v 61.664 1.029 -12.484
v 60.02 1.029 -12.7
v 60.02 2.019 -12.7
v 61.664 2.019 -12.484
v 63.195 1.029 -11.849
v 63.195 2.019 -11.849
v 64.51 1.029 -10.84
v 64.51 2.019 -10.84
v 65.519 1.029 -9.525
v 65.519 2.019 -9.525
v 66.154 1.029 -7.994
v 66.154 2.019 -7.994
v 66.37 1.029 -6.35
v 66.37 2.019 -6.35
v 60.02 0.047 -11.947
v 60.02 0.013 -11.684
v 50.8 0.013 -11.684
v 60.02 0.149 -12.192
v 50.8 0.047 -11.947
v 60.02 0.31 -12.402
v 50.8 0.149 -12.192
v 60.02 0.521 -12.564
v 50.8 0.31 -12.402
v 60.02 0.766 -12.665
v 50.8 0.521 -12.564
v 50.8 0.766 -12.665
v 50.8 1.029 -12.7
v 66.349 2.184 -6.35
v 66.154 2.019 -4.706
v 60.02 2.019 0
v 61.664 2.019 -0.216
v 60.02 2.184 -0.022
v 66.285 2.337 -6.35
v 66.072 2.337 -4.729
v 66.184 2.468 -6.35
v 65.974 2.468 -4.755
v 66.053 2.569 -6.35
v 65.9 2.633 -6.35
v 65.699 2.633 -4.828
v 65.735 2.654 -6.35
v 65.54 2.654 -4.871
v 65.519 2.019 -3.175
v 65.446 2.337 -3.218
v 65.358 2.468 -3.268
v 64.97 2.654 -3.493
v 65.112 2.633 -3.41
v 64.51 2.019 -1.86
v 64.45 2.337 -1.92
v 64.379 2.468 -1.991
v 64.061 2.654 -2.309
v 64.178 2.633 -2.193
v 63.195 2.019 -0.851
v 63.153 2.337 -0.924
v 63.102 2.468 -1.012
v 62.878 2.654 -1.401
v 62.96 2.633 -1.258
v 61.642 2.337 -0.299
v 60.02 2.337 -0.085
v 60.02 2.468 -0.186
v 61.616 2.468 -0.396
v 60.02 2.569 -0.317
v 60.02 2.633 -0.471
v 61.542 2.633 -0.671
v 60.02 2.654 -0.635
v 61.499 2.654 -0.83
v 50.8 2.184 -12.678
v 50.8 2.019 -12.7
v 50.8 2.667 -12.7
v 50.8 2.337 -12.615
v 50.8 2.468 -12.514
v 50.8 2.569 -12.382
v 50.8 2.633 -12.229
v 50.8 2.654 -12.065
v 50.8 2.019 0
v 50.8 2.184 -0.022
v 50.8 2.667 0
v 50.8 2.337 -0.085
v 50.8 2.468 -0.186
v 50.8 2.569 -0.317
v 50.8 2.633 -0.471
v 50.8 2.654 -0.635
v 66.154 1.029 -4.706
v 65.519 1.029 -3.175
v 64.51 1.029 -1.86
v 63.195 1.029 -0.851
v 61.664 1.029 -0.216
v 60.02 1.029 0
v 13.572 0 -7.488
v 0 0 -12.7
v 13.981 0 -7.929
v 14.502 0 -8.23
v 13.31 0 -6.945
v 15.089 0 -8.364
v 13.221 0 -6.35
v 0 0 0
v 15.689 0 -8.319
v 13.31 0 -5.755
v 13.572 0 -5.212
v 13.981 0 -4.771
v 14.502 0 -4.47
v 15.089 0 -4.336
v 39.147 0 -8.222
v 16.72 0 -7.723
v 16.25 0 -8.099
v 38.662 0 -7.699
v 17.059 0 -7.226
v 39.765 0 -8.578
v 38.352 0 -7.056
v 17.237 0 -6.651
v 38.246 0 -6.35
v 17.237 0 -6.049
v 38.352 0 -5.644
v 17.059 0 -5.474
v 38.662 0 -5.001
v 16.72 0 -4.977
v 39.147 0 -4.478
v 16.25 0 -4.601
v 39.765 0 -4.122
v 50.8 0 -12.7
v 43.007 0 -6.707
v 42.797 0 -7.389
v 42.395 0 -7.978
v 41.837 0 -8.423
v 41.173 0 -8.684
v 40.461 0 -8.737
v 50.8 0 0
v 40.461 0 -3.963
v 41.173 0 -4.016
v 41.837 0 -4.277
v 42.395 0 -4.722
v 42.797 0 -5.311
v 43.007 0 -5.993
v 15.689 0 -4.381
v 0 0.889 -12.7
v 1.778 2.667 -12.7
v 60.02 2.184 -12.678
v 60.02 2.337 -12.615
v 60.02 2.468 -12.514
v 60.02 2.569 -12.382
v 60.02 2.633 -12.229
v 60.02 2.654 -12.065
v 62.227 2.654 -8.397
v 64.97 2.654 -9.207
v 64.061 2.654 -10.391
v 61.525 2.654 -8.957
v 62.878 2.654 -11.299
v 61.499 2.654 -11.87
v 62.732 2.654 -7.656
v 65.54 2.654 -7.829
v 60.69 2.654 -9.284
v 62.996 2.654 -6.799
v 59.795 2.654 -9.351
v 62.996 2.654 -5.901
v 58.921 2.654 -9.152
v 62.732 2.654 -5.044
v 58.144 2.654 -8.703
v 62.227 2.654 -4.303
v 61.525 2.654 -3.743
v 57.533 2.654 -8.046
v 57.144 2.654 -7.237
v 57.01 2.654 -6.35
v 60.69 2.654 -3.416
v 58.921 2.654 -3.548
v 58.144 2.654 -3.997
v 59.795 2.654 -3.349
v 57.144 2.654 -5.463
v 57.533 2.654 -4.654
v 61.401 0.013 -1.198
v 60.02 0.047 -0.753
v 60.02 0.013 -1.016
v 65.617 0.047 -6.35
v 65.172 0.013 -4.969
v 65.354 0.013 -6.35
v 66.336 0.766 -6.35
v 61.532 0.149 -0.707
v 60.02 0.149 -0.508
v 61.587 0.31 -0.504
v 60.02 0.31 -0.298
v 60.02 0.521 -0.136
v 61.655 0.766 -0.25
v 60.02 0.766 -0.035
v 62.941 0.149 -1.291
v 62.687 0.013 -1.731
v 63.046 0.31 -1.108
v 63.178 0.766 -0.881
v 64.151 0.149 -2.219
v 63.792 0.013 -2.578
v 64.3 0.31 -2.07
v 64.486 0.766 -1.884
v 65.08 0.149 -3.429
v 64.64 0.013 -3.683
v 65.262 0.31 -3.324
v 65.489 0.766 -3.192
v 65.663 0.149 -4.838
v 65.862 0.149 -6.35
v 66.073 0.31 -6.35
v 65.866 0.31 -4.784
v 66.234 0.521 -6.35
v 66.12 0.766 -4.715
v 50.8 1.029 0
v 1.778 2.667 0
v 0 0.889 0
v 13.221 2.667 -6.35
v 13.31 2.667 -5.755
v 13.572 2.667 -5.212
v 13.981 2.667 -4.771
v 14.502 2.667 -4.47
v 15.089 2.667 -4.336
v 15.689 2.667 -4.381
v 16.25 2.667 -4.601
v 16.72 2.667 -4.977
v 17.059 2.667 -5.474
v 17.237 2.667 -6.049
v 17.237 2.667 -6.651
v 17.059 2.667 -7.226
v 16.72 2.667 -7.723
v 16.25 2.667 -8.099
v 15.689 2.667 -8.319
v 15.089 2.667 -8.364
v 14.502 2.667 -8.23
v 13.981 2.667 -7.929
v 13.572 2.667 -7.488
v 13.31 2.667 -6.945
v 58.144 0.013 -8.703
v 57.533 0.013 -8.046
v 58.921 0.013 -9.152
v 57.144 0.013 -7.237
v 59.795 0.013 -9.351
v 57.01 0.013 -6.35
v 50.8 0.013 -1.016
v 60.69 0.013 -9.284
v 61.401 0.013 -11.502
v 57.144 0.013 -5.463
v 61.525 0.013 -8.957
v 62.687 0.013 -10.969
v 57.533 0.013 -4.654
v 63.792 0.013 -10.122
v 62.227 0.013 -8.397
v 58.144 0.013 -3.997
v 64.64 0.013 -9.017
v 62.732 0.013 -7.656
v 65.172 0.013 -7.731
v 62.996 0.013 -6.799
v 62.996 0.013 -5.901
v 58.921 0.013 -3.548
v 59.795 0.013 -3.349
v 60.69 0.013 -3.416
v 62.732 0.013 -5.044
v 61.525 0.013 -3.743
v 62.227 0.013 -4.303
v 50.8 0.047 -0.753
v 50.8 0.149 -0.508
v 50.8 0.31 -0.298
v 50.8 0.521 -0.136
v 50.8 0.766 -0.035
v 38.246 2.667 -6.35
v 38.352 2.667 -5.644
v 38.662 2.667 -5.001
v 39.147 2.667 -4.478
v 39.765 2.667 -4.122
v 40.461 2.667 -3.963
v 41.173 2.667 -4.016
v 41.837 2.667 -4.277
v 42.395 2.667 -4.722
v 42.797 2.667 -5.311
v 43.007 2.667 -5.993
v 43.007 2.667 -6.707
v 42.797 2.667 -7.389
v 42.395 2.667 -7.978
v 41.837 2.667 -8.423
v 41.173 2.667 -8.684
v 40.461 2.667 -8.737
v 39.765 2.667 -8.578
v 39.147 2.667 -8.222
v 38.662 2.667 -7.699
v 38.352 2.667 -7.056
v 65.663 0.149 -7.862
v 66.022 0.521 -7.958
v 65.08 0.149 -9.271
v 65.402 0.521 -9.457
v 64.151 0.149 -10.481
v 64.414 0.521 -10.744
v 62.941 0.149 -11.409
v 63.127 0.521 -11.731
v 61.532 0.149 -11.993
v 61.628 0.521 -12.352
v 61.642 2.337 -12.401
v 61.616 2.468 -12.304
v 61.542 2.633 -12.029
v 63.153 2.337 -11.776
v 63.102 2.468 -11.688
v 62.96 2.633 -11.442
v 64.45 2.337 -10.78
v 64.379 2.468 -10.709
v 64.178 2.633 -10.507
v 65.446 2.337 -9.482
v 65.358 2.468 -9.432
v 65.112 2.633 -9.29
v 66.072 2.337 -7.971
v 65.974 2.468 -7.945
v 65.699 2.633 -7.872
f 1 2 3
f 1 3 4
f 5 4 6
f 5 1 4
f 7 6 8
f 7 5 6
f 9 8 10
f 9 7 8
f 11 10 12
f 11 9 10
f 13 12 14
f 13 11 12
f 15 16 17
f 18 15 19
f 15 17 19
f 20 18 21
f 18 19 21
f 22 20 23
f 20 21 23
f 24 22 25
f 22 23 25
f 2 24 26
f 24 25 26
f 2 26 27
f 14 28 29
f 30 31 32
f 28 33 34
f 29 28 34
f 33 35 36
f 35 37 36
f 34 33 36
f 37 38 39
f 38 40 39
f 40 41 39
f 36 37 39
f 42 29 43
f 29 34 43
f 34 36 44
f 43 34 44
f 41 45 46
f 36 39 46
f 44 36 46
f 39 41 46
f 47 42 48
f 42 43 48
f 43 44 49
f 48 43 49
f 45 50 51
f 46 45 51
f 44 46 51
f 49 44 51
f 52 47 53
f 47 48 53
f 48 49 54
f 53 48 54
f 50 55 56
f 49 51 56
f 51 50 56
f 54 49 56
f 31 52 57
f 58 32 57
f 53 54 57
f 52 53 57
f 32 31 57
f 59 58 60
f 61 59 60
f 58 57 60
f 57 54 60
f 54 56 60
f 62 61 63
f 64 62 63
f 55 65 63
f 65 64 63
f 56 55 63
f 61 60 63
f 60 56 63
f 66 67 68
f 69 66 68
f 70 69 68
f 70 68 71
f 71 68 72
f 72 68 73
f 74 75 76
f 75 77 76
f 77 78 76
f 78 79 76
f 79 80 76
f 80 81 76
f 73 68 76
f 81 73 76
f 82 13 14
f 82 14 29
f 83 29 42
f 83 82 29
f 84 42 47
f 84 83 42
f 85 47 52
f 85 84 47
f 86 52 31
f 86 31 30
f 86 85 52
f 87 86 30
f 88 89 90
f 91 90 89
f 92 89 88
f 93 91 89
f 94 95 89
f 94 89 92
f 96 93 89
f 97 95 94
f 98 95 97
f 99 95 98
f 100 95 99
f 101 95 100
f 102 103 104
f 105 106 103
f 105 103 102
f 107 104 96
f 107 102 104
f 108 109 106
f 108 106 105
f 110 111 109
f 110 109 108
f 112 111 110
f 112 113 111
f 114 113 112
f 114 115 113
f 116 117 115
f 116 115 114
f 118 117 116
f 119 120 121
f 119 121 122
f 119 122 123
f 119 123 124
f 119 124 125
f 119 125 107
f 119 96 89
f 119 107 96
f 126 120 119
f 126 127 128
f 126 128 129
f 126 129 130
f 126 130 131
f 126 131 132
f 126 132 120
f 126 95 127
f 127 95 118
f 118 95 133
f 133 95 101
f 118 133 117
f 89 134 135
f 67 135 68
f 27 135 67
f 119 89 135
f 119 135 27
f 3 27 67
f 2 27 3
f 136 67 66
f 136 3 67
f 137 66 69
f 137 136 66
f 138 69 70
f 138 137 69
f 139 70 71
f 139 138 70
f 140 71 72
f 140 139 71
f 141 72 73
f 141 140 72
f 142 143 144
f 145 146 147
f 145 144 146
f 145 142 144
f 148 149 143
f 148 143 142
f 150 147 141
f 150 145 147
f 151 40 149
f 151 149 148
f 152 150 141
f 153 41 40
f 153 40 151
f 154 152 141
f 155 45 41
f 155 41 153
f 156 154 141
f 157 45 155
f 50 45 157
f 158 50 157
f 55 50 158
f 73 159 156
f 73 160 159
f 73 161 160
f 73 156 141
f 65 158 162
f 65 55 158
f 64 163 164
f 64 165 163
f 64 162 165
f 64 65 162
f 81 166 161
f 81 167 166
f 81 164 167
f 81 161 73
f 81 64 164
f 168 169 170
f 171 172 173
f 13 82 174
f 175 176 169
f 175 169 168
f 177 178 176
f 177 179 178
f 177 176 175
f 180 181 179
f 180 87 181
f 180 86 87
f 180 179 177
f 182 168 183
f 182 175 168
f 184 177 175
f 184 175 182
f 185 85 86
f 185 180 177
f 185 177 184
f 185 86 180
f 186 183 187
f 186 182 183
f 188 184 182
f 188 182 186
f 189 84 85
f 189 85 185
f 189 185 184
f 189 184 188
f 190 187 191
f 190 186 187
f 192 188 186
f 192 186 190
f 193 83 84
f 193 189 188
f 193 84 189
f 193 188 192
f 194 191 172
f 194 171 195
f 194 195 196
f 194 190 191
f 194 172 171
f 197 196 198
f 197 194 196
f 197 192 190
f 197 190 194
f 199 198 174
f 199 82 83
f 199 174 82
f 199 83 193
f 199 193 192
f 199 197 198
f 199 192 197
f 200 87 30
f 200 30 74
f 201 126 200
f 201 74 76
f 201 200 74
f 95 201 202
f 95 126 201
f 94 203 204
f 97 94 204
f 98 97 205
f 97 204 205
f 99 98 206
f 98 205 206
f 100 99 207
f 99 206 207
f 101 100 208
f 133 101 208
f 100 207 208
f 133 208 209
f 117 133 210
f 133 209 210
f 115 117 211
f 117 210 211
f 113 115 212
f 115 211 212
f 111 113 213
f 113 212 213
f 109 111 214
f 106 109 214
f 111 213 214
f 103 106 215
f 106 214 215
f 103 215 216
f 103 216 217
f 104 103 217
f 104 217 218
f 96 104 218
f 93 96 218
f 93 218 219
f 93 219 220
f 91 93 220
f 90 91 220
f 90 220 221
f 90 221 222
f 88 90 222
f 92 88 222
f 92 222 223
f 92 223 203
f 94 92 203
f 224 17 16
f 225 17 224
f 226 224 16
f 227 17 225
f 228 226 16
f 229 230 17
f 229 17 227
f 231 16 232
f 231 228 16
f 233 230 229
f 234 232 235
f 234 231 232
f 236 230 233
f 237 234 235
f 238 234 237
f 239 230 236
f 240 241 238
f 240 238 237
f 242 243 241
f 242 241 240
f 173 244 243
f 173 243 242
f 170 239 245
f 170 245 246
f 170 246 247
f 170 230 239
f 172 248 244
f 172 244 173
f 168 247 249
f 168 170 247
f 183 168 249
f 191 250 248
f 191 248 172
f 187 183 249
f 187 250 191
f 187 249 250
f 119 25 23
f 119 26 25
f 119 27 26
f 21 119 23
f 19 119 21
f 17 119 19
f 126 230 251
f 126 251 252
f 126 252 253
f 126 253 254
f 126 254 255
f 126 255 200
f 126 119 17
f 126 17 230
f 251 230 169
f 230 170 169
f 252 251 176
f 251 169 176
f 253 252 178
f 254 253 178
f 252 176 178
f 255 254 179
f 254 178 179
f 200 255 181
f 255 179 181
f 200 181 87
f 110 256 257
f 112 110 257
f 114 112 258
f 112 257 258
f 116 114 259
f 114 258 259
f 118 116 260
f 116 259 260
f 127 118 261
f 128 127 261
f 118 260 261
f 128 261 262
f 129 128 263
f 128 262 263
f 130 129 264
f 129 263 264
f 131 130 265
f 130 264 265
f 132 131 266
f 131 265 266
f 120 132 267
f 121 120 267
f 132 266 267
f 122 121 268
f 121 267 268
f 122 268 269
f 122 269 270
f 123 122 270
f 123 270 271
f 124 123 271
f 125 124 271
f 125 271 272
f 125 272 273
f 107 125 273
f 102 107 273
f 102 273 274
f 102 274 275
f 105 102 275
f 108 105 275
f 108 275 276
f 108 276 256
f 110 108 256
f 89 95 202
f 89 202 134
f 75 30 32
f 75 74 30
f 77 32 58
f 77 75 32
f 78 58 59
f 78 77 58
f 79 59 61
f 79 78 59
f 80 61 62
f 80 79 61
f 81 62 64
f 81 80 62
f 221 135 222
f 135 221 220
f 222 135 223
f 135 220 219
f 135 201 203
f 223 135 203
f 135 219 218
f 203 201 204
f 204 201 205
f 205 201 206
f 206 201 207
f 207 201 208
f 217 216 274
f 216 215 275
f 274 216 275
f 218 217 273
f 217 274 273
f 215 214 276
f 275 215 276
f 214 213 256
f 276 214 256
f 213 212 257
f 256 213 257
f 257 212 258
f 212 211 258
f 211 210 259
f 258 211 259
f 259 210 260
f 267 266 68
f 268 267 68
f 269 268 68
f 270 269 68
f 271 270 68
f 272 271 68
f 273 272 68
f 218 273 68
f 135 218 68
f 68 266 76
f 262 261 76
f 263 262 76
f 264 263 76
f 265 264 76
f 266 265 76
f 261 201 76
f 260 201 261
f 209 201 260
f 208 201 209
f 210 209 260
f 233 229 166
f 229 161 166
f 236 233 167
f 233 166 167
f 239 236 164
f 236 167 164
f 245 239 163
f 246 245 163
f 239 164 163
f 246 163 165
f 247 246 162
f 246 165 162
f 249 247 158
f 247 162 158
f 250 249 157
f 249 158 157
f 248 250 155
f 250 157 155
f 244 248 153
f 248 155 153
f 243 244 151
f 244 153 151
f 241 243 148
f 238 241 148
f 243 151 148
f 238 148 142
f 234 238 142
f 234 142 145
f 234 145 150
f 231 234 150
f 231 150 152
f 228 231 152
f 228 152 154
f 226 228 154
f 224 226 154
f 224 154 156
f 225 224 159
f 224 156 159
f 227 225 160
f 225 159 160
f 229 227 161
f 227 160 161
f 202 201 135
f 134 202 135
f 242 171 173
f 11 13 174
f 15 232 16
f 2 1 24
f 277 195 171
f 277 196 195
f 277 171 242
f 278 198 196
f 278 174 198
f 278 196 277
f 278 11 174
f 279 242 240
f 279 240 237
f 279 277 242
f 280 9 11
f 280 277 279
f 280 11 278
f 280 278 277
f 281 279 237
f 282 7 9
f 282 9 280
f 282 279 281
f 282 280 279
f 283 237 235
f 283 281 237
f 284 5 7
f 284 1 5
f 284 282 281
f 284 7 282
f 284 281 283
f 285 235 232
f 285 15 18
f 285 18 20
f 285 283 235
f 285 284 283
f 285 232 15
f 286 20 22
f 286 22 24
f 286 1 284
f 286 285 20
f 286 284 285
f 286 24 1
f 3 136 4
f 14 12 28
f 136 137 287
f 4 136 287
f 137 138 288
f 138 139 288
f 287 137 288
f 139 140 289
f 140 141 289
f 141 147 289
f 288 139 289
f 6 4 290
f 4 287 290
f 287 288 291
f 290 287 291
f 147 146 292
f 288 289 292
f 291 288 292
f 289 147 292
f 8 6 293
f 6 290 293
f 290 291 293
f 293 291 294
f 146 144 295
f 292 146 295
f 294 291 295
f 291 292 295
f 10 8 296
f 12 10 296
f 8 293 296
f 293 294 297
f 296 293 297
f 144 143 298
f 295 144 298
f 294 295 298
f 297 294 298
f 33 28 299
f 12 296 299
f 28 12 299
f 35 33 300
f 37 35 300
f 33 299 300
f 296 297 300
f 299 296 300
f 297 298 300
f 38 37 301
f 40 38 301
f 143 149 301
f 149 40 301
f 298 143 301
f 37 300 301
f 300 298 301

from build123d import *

# Parameters (mm, degrees)
F1_DEPTH  = 2.667
F3_D      = 6.0198
F4_D      = 4.7879
F5_D      = 4.0386
F6_W      = 32.8803089343
F6_H      = 42.4424372282
F7_DEPTH  = 0.0127
F8_W      = 27.7899198272
F8_H      = 25.566725319
F9_DEPTH  = 0.0127
F10_R     = 1.016
F11_R     = 0.635
F12_SIZE2 = 1.778
F12_SIZE  = 1.778


with BuildPart() as f1:
    # F0 (on Front) → F1 (new body)
    with BuildSketch(Plane.XZ):
        with BuildLine():
            Line((60.0202, 0), (0, 0))
            Line((0, 0), (0, -12.7))
            Line((0, -12.7), (60.0202, -12.7))
            ThreePointArc((60.0202, -12.7), (64.5103280605, -10.8401280605), (66.3702, -6.35))
            ThreePointArc((66.3702, -6.35), (64.5103280605, -1.8598719395), (60.0202, 0))
        make_face()
    extrude(amount=-F1_DEPTH)

    # F3 (through all)
    with Locations(Plane.XZ):
        with Locations((60.0202, -6.35)):
            Hole(F3_D / 2)

    # F4 (through all)
    with Locations(Plane.XZ):
        with Locations((40.64, -6.35)):
            Hole(F4_D / 2)

    # F5 (through all)
    with Locations(Plane.XZ):
        with Locations((15.24, -6.35)):
            Hole(F5_D / 2)

    # F6 (on face) → F7 (cut)
    with BuildSketch(Plane.XZ):
        with Locations((67.2401544672, -9.9617778324)):
            Rectangle(F6_W, F6_H)
    extrude(amount=-F7_DEPTH, mode=Mode.SUBTRACT)

    # F8 (on face) → F9 (cut)
    with BuildSketch(Plane(origin=(0, 2.667, 0), x_dir=(-1, 0, 0), z_dir=(0, 1, 0))):
        with Locations((-64.6949599136, -4.1028452106)):
            Rectangle(F8_W, F8_H)
    extrude(amount=-F9_DEPTH, mode=Mode.SUBTRACT)

    # F10
    f10_edges = [f1.edges().sort_by_distance(p)[0] for p in [
        (55.4101, 0.0127, -12.7),
    ]]
    fillet(f10_edges, radius=F10_R)

    # F11
    f11_edges = [f1.edges().sort_by_distance(p)[0] for p in [
        (55.4101, 2.6543, 0),
    ]]
    fillet(f11_edges, radius=F11_R)

    # F12
    f12_edges = [f1.edges().sort_by_distance(p)[0] for p in [
        (0, 2.667, -6.35),
    ]]
    chamfer(f12_edges, length=F12_SIZE, length2=F12_SIZE2)


solid = f1.part
